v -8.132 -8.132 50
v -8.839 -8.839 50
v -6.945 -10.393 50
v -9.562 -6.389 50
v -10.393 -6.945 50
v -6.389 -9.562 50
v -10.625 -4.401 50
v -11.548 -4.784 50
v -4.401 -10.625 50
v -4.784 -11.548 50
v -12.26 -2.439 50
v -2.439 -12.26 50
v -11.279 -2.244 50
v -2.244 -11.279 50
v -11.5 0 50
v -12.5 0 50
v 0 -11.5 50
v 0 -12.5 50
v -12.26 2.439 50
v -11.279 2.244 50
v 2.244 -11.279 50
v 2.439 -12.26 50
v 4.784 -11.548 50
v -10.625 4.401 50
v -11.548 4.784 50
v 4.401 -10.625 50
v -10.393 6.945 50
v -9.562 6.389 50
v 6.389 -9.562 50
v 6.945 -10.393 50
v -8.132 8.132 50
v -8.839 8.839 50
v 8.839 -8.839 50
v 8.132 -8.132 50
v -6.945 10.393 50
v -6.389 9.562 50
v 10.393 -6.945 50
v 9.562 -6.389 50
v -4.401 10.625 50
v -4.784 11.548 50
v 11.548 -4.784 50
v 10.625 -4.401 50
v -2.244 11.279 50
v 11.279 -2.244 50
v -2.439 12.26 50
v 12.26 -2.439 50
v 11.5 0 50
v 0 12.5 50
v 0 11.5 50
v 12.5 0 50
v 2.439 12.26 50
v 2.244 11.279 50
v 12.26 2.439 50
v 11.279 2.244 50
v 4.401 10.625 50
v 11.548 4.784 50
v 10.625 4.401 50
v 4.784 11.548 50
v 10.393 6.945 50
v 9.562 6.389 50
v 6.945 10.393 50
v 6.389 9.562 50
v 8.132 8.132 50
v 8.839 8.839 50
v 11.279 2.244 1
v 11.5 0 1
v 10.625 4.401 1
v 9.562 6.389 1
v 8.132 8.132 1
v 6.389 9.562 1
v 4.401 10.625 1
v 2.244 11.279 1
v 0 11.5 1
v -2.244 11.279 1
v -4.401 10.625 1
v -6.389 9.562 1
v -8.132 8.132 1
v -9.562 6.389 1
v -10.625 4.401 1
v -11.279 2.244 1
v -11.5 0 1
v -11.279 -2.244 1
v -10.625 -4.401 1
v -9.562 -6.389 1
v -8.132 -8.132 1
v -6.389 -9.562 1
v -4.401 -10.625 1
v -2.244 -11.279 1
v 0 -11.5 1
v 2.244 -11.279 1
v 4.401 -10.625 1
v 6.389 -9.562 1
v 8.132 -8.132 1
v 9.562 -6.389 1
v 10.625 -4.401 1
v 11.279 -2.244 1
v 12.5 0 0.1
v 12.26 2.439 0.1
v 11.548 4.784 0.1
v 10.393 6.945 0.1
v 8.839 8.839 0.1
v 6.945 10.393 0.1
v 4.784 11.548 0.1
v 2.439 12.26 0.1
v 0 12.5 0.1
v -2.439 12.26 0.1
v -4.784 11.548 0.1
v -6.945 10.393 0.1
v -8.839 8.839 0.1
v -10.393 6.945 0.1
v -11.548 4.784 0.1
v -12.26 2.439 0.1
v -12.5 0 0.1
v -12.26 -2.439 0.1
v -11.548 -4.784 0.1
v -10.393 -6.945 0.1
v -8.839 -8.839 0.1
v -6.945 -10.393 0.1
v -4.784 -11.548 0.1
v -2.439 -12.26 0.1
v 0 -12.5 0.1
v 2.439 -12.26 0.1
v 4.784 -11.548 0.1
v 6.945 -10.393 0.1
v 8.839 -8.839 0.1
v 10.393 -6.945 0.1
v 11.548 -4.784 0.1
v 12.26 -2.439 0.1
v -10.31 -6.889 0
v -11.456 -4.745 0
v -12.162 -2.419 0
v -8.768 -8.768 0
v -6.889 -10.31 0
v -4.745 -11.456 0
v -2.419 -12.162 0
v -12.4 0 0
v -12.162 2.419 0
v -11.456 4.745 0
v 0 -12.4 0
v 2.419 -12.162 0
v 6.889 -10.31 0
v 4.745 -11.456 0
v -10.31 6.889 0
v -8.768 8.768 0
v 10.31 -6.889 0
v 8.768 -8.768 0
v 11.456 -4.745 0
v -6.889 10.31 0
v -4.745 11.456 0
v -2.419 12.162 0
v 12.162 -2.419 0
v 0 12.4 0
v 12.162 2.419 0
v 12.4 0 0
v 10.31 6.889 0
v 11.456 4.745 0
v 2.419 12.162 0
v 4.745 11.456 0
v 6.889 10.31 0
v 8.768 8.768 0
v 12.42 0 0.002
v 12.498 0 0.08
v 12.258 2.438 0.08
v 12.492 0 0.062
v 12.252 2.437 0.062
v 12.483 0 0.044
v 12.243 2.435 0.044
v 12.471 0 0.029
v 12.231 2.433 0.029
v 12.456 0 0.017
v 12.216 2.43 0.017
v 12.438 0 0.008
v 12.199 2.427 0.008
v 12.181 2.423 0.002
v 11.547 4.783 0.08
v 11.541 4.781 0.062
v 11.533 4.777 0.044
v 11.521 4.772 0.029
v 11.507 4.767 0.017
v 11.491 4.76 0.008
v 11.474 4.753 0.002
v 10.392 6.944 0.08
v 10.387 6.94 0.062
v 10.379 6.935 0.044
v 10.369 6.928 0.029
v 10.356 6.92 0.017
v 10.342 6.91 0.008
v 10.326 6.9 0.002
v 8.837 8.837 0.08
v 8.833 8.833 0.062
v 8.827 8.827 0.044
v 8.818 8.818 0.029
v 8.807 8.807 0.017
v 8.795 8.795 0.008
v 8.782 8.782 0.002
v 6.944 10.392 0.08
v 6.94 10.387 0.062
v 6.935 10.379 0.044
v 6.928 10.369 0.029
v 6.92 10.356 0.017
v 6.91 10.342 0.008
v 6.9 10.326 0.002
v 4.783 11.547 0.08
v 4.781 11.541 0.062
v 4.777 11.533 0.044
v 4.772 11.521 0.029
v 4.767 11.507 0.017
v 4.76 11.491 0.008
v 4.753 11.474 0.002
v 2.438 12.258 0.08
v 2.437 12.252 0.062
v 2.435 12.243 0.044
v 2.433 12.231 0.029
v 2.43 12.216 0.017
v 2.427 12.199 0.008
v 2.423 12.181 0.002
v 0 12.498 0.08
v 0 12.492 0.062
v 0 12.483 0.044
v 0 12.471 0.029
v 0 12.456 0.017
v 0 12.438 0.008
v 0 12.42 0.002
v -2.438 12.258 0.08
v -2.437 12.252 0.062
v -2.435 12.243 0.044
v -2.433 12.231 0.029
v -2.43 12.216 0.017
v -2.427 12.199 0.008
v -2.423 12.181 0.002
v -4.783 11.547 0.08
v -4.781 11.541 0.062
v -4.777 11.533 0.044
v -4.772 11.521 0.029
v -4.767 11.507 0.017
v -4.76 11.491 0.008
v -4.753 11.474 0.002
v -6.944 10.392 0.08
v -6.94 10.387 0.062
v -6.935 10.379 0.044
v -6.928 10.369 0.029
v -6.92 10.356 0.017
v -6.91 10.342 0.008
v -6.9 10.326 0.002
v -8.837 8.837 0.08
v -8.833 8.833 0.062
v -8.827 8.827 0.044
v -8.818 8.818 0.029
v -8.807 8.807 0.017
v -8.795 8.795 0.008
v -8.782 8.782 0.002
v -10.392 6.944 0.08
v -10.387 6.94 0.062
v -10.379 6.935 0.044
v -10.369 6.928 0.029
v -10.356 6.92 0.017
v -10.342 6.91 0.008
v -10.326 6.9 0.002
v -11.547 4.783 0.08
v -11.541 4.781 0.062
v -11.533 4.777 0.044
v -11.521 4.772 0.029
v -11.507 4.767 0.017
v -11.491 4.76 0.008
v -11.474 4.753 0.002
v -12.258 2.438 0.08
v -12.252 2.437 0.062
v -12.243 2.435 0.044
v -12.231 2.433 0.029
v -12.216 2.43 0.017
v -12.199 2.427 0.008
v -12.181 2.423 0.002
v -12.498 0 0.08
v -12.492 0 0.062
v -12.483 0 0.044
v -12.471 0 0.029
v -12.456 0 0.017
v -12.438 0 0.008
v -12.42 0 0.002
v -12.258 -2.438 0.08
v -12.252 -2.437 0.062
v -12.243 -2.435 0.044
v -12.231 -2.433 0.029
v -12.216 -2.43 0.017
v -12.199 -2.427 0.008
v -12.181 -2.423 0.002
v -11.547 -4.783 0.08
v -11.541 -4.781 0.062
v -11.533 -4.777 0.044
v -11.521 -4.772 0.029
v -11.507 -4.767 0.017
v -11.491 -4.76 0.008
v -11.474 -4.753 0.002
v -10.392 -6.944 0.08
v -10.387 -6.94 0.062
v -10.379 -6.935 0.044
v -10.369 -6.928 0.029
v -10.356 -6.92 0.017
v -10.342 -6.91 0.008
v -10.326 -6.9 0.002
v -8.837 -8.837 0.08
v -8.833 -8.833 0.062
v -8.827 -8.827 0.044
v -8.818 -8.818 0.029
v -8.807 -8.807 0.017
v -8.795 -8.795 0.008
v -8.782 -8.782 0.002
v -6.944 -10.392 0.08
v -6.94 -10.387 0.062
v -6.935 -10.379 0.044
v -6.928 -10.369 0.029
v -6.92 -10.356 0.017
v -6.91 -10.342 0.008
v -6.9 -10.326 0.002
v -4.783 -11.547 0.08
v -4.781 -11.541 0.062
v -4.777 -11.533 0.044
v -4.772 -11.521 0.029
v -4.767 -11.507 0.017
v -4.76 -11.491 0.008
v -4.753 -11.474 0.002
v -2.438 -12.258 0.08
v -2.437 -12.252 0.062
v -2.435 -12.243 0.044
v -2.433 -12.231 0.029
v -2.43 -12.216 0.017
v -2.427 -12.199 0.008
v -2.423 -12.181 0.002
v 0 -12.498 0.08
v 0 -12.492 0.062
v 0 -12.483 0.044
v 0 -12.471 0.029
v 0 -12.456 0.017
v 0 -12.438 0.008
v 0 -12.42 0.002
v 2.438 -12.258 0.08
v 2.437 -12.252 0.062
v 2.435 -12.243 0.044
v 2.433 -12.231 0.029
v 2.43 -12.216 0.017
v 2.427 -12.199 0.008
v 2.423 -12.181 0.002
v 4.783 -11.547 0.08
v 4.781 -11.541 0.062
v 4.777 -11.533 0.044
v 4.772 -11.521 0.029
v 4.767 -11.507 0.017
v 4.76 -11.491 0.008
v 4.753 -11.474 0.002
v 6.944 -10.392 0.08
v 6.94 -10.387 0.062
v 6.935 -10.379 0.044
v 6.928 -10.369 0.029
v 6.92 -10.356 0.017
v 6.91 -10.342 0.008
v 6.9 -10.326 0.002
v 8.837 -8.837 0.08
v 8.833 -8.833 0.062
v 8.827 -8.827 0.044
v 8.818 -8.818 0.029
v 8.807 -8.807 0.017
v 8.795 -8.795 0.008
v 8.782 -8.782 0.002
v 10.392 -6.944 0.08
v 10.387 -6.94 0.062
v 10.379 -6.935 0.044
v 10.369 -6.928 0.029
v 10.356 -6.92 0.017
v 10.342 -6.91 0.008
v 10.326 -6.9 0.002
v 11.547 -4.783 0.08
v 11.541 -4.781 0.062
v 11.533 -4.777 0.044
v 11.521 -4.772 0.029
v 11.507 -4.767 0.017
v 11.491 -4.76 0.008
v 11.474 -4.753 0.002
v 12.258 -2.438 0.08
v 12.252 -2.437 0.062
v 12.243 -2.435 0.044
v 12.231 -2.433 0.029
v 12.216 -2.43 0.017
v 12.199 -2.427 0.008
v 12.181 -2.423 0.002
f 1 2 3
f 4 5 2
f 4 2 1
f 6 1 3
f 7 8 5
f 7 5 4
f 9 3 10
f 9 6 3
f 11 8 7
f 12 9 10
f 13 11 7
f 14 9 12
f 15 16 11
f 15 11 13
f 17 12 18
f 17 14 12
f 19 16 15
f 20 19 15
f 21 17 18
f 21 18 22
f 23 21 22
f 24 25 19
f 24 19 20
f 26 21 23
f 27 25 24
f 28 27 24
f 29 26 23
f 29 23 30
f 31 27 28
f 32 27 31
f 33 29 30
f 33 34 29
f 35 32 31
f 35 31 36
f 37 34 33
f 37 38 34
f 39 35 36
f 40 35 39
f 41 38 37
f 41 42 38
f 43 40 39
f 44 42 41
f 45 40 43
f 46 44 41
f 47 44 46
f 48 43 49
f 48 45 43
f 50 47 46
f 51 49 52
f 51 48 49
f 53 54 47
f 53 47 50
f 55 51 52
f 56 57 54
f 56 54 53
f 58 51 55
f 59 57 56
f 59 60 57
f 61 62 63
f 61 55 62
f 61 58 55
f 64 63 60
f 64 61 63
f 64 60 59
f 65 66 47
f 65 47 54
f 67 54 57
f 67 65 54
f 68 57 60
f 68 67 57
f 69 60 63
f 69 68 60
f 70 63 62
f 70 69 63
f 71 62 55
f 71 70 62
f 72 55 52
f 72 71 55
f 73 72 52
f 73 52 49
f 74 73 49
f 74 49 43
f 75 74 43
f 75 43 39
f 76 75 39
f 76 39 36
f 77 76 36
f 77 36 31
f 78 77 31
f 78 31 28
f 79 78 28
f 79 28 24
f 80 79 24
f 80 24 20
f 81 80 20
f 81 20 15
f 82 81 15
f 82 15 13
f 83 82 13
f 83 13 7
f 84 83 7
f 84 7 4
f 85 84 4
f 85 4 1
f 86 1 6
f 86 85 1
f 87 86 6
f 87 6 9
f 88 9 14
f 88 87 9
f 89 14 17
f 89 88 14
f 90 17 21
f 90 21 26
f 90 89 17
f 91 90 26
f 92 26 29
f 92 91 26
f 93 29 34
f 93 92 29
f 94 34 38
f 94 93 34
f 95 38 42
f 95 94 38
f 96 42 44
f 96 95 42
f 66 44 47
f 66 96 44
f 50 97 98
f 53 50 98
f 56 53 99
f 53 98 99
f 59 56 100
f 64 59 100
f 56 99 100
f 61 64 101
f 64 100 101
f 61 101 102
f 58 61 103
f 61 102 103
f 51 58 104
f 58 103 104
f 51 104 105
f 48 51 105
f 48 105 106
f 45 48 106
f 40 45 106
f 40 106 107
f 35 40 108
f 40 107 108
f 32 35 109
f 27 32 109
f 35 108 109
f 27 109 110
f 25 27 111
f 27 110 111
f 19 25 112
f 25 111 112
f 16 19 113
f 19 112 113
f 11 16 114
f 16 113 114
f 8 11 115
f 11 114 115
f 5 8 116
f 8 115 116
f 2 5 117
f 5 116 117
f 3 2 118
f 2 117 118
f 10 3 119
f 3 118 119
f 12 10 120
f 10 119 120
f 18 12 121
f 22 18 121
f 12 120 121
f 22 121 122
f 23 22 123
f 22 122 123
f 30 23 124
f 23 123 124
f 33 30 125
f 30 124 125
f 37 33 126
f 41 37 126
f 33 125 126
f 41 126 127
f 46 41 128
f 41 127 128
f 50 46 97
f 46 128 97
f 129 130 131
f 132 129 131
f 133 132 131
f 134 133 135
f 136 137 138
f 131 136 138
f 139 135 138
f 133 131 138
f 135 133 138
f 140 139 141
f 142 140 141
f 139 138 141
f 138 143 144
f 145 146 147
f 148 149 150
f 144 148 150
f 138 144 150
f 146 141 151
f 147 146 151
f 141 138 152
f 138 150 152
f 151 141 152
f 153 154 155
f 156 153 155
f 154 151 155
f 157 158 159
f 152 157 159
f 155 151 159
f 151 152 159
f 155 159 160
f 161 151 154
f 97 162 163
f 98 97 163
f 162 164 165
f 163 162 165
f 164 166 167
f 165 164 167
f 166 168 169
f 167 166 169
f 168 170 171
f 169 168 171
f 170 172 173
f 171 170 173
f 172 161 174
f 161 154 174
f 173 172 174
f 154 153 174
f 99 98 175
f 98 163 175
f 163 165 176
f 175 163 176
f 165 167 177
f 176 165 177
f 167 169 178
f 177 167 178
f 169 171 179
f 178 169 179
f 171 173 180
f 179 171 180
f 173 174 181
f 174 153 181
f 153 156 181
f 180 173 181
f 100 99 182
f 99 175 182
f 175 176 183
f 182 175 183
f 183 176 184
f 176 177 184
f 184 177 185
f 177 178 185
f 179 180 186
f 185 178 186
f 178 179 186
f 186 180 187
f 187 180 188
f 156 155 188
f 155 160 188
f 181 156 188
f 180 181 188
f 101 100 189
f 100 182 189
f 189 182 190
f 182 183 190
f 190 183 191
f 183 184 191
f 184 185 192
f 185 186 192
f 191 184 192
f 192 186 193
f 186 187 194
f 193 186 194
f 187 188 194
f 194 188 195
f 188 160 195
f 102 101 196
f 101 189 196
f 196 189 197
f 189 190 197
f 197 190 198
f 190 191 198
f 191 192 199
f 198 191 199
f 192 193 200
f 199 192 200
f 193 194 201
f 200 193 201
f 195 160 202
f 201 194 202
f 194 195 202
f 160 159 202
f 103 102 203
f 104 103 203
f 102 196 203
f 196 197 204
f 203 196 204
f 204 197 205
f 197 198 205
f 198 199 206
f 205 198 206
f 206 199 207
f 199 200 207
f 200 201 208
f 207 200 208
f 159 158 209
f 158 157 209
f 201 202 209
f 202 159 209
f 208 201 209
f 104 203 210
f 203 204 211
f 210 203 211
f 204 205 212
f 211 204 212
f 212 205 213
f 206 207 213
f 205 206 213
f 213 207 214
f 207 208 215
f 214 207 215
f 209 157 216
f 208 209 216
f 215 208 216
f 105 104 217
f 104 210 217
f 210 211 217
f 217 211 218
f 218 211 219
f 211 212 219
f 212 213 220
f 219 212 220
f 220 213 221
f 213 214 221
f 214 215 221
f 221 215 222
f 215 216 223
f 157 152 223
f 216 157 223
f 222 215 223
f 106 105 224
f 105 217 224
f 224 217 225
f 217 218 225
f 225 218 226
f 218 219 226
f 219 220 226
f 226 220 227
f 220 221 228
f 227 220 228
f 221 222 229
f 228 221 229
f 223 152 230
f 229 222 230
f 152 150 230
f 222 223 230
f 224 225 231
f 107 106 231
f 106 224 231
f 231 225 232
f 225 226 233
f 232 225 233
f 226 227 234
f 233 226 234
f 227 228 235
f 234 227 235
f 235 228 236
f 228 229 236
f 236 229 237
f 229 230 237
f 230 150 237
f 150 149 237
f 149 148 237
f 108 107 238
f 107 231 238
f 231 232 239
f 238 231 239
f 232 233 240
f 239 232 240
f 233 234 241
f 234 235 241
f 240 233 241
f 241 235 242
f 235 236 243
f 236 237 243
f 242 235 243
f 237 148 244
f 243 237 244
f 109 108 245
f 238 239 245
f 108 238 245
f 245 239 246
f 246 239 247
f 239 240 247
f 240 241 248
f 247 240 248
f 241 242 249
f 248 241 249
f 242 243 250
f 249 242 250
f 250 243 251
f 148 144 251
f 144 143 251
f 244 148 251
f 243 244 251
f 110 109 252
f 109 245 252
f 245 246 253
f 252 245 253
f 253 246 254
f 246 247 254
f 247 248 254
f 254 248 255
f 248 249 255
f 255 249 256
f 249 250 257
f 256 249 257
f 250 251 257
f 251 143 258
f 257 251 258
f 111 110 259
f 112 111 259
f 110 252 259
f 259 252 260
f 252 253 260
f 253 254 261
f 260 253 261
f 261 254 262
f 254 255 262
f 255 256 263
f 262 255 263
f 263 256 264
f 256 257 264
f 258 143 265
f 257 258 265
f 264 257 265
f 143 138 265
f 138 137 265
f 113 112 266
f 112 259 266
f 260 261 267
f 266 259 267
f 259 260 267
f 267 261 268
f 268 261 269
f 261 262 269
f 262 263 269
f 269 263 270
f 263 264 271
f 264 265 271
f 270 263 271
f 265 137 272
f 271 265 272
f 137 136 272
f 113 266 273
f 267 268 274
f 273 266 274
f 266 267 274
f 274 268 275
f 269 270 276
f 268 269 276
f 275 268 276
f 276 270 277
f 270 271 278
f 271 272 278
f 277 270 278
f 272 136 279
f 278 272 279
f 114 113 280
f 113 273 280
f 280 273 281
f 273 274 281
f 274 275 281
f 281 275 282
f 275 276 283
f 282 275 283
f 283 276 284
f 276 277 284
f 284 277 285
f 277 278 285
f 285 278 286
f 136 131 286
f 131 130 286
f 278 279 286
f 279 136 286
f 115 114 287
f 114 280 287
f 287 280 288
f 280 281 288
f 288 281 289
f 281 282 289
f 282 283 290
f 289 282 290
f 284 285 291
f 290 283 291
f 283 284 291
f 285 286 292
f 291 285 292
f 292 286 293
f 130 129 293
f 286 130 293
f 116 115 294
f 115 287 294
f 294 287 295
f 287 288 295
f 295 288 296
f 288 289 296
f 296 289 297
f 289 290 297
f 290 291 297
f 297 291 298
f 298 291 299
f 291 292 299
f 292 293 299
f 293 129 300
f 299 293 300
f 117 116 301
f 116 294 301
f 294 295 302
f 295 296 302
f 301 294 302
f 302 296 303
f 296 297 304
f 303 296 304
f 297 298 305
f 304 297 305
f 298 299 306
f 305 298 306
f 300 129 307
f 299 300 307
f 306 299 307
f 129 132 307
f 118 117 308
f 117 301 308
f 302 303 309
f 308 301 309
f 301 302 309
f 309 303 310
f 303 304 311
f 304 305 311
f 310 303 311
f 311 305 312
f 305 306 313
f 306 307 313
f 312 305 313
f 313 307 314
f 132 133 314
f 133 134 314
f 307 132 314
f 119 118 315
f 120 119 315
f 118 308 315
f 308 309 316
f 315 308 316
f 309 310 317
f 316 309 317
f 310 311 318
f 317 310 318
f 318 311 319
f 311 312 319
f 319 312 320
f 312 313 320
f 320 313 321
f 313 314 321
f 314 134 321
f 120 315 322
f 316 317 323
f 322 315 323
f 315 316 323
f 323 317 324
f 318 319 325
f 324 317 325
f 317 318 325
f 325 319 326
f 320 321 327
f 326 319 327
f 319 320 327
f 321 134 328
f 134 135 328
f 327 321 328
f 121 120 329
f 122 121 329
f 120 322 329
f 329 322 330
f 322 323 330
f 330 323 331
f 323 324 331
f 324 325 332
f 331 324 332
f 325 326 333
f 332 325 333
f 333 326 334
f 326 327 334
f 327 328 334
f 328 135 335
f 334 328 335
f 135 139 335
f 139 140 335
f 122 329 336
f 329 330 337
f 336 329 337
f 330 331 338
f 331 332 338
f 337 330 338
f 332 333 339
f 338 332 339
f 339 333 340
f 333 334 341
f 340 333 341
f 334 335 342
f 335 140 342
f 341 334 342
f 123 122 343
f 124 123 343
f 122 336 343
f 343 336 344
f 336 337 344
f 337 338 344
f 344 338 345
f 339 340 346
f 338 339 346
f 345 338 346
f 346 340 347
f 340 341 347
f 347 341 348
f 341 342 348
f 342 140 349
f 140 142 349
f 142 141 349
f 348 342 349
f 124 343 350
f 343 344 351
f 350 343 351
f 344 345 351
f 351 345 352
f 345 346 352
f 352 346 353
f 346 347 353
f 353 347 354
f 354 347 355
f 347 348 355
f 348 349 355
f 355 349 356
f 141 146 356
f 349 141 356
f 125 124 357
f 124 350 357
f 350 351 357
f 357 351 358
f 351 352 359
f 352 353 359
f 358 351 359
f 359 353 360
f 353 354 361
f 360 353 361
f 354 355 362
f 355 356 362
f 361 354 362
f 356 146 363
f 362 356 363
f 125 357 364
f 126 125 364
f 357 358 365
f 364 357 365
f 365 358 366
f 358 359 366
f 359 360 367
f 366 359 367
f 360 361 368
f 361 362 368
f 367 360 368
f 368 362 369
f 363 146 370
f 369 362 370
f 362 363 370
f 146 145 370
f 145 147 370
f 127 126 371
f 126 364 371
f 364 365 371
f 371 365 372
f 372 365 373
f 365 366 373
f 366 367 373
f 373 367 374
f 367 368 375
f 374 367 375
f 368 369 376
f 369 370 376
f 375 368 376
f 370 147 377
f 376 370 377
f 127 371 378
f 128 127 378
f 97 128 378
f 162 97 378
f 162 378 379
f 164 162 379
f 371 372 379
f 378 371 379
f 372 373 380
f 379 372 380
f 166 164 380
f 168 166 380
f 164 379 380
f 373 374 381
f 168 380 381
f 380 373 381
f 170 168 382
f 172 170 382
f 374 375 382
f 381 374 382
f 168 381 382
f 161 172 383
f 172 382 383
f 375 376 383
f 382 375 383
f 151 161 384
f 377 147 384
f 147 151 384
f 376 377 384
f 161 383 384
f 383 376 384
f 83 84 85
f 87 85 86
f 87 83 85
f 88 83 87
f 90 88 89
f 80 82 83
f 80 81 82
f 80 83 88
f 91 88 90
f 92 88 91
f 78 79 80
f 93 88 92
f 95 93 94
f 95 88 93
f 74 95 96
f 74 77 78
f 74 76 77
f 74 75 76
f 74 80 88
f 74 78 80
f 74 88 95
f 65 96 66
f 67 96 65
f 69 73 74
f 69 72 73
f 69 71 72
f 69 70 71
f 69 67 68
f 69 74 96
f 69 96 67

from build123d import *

# Parameters (mm, degrees)
F0_R     = 12.5
F1_DEPTH = 50
F2_T     = -1
F3_R     = 0.1


with BuildPart() as f1:
    # F0 (on Top) → F1 (new body)
    with BuildSketch(Plane.XY):
        Circle(F0_R)
    extrude(amount=F1_DEPTH)

    # F2
    f2_openings = [f1.faces().sort_by_distance(p)[0] for p in [
        (0, 0, 50),
    ]]
    offset(amount=F2_T, openings=f2_openings)

    # F3
    f3_edges = [f1.edges().sort_by_distance(p)[0] for p in [
        (-12.5, 0, 0),
    ]]
    fillet(f3_edges, radius=F3_R)


solid = f1.part
